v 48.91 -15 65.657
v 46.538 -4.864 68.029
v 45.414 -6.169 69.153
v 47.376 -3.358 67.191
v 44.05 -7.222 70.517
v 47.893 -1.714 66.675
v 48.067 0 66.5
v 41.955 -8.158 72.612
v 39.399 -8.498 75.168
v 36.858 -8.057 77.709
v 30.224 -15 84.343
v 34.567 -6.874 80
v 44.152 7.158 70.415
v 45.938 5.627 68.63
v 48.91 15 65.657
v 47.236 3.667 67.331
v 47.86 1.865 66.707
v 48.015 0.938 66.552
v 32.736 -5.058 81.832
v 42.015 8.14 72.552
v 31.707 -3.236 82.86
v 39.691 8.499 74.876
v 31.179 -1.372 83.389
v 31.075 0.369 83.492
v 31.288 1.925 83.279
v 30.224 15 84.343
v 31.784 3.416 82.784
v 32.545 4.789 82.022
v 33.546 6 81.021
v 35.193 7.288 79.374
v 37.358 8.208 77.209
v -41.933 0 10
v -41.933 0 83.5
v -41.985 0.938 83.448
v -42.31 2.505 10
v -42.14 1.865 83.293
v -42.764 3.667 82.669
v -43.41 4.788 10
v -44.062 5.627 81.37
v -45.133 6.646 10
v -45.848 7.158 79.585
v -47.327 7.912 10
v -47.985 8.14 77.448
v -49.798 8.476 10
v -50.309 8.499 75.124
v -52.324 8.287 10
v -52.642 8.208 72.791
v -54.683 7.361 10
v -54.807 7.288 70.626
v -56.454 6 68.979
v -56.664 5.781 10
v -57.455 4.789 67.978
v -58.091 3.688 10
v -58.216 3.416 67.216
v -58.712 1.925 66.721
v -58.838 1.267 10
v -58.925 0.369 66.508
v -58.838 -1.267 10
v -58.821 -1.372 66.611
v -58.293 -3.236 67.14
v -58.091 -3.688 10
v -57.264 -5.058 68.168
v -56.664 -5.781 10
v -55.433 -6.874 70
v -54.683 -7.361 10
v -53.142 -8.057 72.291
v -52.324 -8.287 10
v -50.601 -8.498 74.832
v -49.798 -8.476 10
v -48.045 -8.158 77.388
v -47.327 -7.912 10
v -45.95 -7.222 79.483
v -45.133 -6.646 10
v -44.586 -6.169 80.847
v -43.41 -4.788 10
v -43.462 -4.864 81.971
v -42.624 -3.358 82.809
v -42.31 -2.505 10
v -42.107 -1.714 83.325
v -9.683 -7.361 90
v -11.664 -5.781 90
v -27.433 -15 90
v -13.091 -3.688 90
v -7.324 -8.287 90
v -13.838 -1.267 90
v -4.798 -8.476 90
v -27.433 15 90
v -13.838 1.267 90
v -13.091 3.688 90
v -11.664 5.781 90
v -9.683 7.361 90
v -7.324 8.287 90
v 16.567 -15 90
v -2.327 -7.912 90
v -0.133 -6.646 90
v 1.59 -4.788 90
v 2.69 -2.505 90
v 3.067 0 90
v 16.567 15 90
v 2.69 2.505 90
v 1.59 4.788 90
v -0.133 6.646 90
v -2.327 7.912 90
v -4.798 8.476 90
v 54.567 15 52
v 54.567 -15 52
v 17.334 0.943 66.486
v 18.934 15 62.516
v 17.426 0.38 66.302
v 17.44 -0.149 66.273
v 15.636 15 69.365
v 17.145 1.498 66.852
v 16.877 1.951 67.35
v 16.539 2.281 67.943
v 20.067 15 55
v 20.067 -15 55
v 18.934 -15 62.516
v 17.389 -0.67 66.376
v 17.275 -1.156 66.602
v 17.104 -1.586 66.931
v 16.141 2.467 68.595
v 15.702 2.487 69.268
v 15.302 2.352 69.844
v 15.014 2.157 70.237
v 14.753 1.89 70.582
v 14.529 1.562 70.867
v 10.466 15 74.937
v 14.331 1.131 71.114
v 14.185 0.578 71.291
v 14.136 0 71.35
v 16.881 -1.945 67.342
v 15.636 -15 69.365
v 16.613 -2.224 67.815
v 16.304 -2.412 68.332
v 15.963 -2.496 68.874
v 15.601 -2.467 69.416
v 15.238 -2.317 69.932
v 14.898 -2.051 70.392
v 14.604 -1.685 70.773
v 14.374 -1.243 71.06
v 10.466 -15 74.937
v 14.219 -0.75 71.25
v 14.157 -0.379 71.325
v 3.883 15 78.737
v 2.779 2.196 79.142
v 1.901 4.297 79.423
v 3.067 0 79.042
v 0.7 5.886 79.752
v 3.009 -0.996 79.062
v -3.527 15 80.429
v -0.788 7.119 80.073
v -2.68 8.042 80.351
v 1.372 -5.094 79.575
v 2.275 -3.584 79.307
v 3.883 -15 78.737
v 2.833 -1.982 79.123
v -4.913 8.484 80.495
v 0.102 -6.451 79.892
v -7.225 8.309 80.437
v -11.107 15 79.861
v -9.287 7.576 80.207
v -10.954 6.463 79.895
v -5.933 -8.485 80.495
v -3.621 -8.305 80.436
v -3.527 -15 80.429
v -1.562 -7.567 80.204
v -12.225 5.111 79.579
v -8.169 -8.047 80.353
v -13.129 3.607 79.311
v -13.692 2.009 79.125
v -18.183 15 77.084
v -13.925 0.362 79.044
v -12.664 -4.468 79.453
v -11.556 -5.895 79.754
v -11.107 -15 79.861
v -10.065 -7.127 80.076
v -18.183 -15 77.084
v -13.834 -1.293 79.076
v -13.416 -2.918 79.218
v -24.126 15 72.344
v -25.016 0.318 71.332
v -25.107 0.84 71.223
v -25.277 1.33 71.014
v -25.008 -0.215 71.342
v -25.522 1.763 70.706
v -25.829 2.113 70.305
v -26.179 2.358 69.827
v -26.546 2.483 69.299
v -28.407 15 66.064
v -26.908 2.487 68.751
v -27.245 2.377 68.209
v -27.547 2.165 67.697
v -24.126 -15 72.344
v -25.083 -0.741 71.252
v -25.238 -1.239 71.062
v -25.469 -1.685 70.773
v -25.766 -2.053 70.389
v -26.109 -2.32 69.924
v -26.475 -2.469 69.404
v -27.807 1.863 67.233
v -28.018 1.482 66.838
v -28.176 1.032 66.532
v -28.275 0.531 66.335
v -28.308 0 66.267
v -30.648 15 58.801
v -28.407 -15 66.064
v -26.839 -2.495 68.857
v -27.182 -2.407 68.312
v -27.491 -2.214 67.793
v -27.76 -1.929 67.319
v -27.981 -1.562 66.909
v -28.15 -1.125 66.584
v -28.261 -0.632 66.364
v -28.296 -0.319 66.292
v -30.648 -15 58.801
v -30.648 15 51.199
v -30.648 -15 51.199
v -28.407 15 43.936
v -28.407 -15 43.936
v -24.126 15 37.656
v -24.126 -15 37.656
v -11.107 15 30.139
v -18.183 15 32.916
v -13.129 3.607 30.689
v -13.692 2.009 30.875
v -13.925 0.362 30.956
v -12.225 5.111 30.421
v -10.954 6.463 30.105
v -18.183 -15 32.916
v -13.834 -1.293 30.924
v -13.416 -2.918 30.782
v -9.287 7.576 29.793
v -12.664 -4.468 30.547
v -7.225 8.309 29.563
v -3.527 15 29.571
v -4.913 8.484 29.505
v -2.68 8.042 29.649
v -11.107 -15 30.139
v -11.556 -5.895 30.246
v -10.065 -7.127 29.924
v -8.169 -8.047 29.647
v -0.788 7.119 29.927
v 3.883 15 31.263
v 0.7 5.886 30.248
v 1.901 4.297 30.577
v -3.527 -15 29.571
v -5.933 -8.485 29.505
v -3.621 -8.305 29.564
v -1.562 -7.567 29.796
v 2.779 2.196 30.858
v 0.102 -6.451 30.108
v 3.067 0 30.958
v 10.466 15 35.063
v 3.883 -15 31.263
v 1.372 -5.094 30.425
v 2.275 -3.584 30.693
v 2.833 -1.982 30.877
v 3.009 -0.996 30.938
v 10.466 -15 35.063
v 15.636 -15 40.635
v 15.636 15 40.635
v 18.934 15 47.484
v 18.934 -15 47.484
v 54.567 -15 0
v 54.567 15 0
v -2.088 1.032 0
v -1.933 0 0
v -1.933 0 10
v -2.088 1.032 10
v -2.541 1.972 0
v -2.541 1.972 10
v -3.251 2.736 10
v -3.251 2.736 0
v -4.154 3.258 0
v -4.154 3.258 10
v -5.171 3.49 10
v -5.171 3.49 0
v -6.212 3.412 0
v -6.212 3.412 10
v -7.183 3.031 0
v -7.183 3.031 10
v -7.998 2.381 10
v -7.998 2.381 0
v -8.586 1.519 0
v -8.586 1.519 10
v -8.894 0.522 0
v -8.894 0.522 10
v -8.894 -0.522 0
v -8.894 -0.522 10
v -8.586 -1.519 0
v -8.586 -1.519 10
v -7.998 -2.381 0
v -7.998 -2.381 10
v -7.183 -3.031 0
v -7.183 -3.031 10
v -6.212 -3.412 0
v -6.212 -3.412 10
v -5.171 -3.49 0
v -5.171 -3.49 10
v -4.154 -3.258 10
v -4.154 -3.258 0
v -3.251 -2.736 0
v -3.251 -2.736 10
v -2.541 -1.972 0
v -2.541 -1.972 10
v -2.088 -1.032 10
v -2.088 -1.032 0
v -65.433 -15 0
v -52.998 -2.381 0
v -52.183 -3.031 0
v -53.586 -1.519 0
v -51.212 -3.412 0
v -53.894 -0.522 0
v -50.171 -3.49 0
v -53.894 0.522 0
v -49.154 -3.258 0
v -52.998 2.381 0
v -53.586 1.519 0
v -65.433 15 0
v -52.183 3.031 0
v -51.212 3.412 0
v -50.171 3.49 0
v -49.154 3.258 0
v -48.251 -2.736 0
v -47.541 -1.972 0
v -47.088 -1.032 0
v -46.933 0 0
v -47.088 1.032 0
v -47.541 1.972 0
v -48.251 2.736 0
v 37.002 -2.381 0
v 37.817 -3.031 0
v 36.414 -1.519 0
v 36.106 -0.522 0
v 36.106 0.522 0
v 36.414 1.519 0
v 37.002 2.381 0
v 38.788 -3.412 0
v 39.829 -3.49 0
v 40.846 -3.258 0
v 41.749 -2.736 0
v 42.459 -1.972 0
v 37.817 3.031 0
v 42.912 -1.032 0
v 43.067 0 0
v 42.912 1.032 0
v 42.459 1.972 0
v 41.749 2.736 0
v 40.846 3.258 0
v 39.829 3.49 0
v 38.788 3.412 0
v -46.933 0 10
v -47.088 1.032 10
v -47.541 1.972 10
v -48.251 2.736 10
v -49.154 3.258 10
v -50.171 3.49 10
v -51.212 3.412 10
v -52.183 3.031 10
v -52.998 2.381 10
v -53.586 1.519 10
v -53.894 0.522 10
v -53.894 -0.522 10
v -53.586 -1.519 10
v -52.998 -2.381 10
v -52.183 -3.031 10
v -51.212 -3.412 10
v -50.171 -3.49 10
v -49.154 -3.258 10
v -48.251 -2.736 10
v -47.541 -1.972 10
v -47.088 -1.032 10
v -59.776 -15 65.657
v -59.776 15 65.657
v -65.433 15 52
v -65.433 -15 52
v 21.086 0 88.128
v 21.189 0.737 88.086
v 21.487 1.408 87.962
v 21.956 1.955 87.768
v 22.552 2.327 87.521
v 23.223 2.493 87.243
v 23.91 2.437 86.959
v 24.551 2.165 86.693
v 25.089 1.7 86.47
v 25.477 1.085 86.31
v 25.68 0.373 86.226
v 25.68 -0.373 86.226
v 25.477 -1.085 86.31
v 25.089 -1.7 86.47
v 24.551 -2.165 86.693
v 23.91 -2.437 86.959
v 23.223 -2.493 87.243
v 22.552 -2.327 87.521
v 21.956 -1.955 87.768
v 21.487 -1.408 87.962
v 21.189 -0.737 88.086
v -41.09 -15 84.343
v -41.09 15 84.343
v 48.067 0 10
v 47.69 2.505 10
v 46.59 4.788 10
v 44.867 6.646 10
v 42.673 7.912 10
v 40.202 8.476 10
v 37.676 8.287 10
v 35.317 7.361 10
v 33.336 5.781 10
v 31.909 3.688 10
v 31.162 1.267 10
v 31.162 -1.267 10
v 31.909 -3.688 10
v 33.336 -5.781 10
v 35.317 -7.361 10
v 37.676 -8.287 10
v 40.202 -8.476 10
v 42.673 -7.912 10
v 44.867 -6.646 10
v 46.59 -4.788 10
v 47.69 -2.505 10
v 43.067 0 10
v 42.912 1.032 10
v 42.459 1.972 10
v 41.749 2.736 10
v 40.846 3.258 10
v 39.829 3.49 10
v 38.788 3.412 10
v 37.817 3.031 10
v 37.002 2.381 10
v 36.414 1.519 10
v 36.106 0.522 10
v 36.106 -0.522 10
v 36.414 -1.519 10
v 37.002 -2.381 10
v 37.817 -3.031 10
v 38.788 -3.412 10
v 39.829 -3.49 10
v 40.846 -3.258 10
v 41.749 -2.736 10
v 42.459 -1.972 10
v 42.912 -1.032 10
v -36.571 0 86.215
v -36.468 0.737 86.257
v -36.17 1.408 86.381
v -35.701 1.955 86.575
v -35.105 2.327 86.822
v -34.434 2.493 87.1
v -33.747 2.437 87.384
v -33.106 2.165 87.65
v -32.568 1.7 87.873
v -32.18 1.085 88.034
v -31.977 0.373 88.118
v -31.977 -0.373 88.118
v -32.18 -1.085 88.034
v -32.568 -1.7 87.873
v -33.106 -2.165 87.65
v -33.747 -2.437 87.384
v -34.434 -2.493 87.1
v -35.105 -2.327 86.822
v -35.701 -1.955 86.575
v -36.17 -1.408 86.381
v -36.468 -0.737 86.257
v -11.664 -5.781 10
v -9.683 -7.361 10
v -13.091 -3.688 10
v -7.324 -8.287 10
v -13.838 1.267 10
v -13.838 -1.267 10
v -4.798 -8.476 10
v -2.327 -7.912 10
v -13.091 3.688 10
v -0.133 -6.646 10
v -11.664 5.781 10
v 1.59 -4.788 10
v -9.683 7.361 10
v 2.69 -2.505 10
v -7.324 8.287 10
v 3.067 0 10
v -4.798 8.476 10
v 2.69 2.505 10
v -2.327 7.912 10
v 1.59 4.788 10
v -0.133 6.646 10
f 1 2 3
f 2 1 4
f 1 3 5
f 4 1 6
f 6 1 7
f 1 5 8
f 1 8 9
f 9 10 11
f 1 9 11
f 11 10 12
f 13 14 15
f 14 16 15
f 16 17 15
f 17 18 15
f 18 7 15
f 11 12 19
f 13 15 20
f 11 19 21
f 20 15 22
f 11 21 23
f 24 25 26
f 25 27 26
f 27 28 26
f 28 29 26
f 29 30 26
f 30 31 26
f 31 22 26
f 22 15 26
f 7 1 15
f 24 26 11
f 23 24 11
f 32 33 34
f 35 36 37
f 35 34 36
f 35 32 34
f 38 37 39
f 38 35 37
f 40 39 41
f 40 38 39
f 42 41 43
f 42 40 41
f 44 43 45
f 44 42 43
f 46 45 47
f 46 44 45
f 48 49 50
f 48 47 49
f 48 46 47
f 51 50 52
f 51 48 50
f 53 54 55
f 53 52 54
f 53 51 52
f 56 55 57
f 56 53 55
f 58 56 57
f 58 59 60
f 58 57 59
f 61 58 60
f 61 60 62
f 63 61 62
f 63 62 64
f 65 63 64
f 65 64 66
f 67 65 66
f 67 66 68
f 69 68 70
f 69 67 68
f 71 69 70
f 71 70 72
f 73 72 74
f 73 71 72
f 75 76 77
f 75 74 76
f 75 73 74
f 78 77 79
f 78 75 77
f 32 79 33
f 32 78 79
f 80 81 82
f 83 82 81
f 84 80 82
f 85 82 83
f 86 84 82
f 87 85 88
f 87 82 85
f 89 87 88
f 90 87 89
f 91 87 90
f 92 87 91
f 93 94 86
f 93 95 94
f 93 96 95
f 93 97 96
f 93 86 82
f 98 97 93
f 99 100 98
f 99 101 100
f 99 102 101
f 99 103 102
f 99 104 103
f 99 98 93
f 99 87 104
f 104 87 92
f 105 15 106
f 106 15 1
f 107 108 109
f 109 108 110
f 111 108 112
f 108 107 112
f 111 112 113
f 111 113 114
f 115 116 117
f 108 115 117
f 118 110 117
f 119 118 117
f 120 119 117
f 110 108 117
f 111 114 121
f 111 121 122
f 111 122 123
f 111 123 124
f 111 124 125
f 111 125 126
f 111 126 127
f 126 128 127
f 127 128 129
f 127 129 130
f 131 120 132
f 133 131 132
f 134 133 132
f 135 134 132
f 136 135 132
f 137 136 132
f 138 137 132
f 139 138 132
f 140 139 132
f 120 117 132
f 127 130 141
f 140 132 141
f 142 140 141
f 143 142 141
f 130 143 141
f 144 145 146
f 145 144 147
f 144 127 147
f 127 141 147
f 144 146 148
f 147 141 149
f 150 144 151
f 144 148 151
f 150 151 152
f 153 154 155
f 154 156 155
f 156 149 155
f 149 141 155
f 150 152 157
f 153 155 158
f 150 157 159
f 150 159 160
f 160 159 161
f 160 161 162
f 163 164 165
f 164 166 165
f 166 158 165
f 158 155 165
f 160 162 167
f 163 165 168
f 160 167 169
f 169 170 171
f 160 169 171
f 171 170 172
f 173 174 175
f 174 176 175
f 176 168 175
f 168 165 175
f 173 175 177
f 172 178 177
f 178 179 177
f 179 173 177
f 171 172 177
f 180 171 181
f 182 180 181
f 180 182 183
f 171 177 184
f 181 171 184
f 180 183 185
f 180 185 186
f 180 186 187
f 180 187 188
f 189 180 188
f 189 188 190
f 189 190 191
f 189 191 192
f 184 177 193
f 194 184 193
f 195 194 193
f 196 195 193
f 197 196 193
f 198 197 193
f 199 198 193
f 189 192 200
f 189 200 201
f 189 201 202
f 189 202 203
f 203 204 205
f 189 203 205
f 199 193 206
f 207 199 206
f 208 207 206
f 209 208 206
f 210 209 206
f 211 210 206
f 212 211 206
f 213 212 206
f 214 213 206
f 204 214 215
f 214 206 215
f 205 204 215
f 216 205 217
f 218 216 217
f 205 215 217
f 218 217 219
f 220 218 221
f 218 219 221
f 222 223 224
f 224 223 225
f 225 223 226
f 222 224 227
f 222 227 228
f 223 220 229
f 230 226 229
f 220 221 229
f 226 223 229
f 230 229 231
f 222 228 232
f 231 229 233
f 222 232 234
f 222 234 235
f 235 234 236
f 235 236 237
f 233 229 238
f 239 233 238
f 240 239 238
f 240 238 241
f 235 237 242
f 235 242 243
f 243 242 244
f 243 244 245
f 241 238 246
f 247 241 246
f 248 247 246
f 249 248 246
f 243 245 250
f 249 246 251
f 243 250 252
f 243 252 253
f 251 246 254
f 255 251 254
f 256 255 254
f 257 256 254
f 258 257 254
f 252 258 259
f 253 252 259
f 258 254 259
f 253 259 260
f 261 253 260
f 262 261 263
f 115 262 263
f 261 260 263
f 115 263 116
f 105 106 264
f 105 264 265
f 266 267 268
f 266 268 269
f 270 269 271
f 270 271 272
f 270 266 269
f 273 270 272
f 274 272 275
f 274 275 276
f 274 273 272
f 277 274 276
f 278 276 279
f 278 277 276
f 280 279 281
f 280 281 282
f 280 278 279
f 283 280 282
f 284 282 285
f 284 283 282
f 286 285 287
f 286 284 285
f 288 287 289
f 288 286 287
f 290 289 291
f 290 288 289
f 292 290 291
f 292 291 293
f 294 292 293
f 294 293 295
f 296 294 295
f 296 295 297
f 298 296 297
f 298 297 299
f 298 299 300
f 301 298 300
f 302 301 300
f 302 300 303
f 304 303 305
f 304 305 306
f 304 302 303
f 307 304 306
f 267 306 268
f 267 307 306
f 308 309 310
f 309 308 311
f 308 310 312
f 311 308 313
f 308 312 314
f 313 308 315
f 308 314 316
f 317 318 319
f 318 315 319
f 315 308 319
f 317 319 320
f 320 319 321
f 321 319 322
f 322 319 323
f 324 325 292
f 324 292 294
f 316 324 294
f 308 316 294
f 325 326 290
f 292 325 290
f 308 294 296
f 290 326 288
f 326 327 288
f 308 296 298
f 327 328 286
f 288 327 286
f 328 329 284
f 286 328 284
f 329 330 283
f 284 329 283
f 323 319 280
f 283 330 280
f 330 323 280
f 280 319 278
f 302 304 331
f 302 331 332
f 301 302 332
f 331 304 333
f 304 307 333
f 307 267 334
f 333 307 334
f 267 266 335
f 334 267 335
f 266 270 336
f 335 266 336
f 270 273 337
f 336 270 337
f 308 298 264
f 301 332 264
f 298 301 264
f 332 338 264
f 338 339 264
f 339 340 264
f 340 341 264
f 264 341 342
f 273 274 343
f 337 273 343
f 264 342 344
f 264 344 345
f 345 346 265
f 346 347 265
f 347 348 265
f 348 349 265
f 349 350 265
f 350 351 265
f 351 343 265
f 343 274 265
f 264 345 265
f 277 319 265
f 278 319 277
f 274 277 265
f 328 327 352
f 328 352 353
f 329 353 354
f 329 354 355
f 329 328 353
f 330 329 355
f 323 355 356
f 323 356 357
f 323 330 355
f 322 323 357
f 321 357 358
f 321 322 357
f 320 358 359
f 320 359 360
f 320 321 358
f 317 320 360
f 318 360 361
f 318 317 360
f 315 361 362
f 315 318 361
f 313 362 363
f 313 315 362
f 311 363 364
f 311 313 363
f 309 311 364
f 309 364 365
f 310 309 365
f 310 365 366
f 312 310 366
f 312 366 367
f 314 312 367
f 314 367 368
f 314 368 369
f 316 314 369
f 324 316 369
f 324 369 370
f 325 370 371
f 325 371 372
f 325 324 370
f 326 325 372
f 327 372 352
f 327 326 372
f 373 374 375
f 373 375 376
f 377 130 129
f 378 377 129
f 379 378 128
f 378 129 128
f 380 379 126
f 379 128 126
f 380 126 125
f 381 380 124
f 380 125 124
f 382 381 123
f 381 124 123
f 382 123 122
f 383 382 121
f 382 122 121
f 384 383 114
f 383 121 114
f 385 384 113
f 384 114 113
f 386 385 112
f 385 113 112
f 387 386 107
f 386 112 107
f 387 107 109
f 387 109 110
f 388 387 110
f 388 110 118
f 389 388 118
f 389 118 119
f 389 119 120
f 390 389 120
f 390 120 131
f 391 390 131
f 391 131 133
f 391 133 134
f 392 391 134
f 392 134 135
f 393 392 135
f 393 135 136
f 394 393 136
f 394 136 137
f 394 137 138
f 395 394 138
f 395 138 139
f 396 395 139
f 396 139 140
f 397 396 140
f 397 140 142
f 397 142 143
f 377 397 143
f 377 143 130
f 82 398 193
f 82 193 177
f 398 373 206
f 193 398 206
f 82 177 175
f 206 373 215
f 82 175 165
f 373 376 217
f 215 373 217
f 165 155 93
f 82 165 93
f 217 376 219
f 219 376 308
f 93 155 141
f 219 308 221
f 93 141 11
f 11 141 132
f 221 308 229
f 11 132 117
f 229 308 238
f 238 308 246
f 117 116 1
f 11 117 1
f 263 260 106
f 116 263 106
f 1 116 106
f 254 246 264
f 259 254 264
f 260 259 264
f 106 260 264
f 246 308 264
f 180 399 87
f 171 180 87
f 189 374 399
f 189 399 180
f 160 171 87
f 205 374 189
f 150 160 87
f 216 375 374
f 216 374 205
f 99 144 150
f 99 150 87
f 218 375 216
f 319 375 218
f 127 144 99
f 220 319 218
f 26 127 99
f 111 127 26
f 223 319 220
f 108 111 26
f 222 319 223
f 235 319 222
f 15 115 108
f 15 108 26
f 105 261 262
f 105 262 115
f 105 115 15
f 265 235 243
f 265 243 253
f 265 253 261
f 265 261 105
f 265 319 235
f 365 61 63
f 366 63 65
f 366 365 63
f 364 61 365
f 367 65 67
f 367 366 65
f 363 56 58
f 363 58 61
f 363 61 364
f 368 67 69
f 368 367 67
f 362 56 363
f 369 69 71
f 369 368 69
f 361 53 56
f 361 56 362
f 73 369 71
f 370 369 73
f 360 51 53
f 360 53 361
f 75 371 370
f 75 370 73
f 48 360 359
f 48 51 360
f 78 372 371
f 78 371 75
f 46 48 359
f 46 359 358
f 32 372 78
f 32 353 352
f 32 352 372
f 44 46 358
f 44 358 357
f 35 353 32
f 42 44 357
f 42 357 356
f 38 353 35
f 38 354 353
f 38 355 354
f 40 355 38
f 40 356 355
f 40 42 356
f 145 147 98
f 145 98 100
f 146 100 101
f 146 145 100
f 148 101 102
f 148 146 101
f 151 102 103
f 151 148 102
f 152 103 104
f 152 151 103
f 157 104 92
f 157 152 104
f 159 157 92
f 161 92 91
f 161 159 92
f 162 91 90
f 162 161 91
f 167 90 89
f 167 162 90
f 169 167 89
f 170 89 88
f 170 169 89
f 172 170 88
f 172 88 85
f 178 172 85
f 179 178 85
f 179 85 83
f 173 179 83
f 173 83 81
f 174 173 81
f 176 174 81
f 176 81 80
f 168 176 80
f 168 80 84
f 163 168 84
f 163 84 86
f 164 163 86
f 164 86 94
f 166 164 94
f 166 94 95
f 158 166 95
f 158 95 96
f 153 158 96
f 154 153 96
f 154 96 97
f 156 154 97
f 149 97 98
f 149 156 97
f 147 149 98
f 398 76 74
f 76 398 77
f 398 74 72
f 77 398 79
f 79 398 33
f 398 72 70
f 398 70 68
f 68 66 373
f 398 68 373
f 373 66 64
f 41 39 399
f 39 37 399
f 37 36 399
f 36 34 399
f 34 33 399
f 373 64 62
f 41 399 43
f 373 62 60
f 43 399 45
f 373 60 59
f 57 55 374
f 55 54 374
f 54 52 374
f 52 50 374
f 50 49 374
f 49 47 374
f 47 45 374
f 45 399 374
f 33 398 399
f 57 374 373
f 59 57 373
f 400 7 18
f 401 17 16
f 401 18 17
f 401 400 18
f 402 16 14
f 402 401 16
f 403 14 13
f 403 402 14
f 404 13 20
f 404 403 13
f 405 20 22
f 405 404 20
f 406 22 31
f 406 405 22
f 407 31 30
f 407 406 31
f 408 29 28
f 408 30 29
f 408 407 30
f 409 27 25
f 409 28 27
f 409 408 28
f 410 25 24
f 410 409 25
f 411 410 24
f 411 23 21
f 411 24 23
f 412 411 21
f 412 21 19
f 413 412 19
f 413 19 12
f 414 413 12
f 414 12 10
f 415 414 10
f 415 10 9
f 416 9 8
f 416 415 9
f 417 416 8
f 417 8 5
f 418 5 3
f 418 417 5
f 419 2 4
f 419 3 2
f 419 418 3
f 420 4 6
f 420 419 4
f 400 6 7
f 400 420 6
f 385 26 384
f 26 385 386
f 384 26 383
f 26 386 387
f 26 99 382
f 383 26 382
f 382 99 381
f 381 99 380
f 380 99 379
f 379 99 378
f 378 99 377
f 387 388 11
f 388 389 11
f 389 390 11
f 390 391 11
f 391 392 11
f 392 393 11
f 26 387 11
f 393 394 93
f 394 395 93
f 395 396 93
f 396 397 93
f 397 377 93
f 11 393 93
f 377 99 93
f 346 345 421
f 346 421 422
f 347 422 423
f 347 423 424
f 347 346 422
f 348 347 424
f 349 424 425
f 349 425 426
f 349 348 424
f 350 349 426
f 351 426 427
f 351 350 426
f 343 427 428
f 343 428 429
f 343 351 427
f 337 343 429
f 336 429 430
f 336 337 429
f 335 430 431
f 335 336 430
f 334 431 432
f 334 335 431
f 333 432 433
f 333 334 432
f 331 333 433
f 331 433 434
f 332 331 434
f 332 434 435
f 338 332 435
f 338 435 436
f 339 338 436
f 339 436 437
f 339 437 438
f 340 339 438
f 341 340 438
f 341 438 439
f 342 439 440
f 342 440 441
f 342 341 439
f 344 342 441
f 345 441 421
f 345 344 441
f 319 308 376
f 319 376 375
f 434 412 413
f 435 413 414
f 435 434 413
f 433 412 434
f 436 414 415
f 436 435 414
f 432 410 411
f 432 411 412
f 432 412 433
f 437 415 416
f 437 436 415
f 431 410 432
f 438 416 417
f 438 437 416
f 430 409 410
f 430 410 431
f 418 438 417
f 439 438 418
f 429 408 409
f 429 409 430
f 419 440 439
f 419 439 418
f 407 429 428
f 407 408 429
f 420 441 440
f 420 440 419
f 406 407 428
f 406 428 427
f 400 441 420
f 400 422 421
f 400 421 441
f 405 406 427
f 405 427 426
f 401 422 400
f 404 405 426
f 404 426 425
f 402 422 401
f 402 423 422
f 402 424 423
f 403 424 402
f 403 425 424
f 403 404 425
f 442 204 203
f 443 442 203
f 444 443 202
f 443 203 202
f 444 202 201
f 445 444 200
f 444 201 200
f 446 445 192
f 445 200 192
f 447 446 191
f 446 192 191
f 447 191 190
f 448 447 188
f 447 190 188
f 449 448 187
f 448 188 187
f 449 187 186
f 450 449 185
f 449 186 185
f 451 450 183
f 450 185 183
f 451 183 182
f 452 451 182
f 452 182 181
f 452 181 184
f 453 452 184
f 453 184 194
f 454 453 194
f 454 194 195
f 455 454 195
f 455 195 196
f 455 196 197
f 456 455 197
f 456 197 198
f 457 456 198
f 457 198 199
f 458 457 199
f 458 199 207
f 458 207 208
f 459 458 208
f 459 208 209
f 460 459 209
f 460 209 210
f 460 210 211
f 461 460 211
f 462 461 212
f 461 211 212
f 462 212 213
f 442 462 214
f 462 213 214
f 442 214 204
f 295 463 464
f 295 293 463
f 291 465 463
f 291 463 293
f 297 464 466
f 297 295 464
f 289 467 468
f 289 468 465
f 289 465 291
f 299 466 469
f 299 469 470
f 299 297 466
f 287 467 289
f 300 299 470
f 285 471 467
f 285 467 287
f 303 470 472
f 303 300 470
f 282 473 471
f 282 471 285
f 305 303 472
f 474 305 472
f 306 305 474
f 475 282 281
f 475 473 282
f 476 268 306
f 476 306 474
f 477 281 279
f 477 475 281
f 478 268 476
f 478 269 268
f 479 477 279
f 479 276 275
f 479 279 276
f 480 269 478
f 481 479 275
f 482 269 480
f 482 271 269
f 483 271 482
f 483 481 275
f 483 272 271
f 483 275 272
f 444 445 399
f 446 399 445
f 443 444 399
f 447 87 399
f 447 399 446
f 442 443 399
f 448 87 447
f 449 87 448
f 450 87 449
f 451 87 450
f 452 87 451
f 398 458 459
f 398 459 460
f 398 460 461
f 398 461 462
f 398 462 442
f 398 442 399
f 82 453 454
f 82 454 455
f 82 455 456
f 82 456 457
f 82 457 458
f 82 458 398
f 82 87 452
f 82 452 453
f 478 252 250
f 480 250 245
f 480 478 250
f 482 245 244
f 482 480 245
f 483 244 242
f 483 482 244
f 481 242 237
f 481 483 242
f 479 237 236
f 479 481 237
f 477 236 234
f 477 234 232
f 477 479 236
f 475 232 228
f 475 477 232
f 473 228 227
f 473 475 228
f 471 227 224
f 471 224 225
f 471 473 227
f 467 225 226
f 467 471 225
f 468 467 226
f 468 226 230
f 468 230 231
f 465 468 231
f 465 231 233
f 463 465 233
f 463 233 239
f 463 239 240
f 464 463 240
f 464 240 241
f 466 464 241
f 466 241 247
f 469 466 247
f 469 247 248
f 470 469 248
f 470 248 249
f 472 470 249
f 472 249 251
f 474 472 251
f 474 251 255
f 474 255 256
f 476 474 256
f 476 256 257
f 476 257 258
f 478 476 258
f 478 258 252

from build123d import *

# Parameters (mm, degrees)
F0_W            = 120
F0_H            = 30
F0_R            = 3.5
F1_DEPTH        = 10
F2_W            = 120
F2_H            = 30
F2_R            = 8.5
F3_DEPTH        = 80
F4_R            = 25.5
F5_DEPTH        = 30
F6_T1_DEPTH     = 184.300979278
F7_SIZE         = 8
F10_D           = 5
F10_DEPTH       = 25
F10_TIP         = 1.5021515476
F10_ON_F9_D     = 5
F10_ON_F9_DEPTH = 25
F10_ON_F9_TIP   = 1.5021515476


# Not quite as in the source:
# - a fillet or chamfer that OpenCascade refuses, or shapes differently, is made with other operations: its cross-section is extruded or revolved along the edge and cut away or added


with BuildPart() as f1:
    # F0 (on Top) → F1 (new body)
    with BuildSketch(Plane.XY):
        with Locations((-5.4327639937, 0)):
            Rectangle(F0_W, F0_H)
        with Locations((-50.4327639937, 0)):
            Circle(F0_R, mode=Mode.SUBTRACT)
        with Locations((-5.4327639937, 0)):
            Circle(F0_R, mode=Mode.SUBTRACT)
        with Locations((39.5672360063, 0)):
            Circle(F0_R, mode=Mode.SUBTRACT)
    extrude(amount=F1_DEPTH)

    # F2 (on face) → F3 (join)
    with BuildSketch(Plane.XY.offset(10)):
        with Locations((-5.4327639937, 0)):
            Rectangle(F2_W, F2_H)
        with Locations((-50.4327639937, 0)):
            Circle(F2_R, mode=Mode.SUBTRACT)
        with Locations((-5.4327639937, 0)):
            Circle(F2_R, mode=Mode.SUBTRACT)
        with Locations((39.5672360063, 0)):
            Circle(F2_R, mode=Mode.SUBTRACT)
    extrude(amount=F3_DEPTH)

    # F4 (on face) → F5 (cut)
    with BuildSketch(Plane.XZ.offset(15)):
        with Locations((-5.4327639937, 55)):
            Circle(F4_R)
    extrude(amount=-F5_DEPTH, mode=Mode.SUBTRACT)

    # F6: chamfer of 30 on 2 edges, made by hand

    # F6_s2 → F6_t1 (cut)
    with BuildSketch(Plane.XZ.offset(-92.150489639)):
        Polygon((-35.4327639937, 90), (-65.4327639937, 60), (-65.4327639937, 90), align=None)
        Polygon((54.5672360063, 60), (24.5672360063, 90), (54.5672360063, 90), align=None)
    extrude(amount=F6_T1_DEPTH, mode=Mode.SUBTRACT)

    # F7
    f7_edges = [f1.edges().sort_by_distance(p)[0] for p in [
        (-65.432764, 0, 60),
        (-35.432764, 0, 90),
        (24.567236, 0, 90),
        (54.567236, 0, 60),
    ]]
    chamfer(f7_edges, length=F7_SIZE)

    # F10
    with Locations(Plane(origin=(-35.8372404269, 0, 86.5187518767), x_dir=(0.9238795325, 0, 0.3826834324), z_dir=(-0.3826834324, 0, 0.9238795325))):
        with Locations((1.7059034787, 0)):
            Hole(F10_D / 2, depth=F10_DEPTH)
            with Locations((0, 0, -(F10_DEPTH + F10_TIP / 2))):  # 118° drill point
                Cone(0, F10_D / 2, F10_TIP, mode=Mode.SUBTRACT)

    # F10 on F9
    with Locations(Plane(origin=(34.2460206938, 0, 82.6772076162), x_dir=(0.9238795325, 0, -0.3826834324), z_dir=(0.3826834324, 0, 0.9238795325))):
        with Locations((-11.7443423963, 0)):
            Hole(F10_ON_F9_D / 2, depth=F10_ON_F9_DEPTH)
            with Locations((0, 0, -(F10_ON_F9_DEPTH + F10_ON_F9_TIP / 2))):  # 118° drill point
                Cone(0, F10_ON_F9_D / 2, F10_ON_F9_TIP, mode=Mode.SUBTRACT)


solid = f1.part
